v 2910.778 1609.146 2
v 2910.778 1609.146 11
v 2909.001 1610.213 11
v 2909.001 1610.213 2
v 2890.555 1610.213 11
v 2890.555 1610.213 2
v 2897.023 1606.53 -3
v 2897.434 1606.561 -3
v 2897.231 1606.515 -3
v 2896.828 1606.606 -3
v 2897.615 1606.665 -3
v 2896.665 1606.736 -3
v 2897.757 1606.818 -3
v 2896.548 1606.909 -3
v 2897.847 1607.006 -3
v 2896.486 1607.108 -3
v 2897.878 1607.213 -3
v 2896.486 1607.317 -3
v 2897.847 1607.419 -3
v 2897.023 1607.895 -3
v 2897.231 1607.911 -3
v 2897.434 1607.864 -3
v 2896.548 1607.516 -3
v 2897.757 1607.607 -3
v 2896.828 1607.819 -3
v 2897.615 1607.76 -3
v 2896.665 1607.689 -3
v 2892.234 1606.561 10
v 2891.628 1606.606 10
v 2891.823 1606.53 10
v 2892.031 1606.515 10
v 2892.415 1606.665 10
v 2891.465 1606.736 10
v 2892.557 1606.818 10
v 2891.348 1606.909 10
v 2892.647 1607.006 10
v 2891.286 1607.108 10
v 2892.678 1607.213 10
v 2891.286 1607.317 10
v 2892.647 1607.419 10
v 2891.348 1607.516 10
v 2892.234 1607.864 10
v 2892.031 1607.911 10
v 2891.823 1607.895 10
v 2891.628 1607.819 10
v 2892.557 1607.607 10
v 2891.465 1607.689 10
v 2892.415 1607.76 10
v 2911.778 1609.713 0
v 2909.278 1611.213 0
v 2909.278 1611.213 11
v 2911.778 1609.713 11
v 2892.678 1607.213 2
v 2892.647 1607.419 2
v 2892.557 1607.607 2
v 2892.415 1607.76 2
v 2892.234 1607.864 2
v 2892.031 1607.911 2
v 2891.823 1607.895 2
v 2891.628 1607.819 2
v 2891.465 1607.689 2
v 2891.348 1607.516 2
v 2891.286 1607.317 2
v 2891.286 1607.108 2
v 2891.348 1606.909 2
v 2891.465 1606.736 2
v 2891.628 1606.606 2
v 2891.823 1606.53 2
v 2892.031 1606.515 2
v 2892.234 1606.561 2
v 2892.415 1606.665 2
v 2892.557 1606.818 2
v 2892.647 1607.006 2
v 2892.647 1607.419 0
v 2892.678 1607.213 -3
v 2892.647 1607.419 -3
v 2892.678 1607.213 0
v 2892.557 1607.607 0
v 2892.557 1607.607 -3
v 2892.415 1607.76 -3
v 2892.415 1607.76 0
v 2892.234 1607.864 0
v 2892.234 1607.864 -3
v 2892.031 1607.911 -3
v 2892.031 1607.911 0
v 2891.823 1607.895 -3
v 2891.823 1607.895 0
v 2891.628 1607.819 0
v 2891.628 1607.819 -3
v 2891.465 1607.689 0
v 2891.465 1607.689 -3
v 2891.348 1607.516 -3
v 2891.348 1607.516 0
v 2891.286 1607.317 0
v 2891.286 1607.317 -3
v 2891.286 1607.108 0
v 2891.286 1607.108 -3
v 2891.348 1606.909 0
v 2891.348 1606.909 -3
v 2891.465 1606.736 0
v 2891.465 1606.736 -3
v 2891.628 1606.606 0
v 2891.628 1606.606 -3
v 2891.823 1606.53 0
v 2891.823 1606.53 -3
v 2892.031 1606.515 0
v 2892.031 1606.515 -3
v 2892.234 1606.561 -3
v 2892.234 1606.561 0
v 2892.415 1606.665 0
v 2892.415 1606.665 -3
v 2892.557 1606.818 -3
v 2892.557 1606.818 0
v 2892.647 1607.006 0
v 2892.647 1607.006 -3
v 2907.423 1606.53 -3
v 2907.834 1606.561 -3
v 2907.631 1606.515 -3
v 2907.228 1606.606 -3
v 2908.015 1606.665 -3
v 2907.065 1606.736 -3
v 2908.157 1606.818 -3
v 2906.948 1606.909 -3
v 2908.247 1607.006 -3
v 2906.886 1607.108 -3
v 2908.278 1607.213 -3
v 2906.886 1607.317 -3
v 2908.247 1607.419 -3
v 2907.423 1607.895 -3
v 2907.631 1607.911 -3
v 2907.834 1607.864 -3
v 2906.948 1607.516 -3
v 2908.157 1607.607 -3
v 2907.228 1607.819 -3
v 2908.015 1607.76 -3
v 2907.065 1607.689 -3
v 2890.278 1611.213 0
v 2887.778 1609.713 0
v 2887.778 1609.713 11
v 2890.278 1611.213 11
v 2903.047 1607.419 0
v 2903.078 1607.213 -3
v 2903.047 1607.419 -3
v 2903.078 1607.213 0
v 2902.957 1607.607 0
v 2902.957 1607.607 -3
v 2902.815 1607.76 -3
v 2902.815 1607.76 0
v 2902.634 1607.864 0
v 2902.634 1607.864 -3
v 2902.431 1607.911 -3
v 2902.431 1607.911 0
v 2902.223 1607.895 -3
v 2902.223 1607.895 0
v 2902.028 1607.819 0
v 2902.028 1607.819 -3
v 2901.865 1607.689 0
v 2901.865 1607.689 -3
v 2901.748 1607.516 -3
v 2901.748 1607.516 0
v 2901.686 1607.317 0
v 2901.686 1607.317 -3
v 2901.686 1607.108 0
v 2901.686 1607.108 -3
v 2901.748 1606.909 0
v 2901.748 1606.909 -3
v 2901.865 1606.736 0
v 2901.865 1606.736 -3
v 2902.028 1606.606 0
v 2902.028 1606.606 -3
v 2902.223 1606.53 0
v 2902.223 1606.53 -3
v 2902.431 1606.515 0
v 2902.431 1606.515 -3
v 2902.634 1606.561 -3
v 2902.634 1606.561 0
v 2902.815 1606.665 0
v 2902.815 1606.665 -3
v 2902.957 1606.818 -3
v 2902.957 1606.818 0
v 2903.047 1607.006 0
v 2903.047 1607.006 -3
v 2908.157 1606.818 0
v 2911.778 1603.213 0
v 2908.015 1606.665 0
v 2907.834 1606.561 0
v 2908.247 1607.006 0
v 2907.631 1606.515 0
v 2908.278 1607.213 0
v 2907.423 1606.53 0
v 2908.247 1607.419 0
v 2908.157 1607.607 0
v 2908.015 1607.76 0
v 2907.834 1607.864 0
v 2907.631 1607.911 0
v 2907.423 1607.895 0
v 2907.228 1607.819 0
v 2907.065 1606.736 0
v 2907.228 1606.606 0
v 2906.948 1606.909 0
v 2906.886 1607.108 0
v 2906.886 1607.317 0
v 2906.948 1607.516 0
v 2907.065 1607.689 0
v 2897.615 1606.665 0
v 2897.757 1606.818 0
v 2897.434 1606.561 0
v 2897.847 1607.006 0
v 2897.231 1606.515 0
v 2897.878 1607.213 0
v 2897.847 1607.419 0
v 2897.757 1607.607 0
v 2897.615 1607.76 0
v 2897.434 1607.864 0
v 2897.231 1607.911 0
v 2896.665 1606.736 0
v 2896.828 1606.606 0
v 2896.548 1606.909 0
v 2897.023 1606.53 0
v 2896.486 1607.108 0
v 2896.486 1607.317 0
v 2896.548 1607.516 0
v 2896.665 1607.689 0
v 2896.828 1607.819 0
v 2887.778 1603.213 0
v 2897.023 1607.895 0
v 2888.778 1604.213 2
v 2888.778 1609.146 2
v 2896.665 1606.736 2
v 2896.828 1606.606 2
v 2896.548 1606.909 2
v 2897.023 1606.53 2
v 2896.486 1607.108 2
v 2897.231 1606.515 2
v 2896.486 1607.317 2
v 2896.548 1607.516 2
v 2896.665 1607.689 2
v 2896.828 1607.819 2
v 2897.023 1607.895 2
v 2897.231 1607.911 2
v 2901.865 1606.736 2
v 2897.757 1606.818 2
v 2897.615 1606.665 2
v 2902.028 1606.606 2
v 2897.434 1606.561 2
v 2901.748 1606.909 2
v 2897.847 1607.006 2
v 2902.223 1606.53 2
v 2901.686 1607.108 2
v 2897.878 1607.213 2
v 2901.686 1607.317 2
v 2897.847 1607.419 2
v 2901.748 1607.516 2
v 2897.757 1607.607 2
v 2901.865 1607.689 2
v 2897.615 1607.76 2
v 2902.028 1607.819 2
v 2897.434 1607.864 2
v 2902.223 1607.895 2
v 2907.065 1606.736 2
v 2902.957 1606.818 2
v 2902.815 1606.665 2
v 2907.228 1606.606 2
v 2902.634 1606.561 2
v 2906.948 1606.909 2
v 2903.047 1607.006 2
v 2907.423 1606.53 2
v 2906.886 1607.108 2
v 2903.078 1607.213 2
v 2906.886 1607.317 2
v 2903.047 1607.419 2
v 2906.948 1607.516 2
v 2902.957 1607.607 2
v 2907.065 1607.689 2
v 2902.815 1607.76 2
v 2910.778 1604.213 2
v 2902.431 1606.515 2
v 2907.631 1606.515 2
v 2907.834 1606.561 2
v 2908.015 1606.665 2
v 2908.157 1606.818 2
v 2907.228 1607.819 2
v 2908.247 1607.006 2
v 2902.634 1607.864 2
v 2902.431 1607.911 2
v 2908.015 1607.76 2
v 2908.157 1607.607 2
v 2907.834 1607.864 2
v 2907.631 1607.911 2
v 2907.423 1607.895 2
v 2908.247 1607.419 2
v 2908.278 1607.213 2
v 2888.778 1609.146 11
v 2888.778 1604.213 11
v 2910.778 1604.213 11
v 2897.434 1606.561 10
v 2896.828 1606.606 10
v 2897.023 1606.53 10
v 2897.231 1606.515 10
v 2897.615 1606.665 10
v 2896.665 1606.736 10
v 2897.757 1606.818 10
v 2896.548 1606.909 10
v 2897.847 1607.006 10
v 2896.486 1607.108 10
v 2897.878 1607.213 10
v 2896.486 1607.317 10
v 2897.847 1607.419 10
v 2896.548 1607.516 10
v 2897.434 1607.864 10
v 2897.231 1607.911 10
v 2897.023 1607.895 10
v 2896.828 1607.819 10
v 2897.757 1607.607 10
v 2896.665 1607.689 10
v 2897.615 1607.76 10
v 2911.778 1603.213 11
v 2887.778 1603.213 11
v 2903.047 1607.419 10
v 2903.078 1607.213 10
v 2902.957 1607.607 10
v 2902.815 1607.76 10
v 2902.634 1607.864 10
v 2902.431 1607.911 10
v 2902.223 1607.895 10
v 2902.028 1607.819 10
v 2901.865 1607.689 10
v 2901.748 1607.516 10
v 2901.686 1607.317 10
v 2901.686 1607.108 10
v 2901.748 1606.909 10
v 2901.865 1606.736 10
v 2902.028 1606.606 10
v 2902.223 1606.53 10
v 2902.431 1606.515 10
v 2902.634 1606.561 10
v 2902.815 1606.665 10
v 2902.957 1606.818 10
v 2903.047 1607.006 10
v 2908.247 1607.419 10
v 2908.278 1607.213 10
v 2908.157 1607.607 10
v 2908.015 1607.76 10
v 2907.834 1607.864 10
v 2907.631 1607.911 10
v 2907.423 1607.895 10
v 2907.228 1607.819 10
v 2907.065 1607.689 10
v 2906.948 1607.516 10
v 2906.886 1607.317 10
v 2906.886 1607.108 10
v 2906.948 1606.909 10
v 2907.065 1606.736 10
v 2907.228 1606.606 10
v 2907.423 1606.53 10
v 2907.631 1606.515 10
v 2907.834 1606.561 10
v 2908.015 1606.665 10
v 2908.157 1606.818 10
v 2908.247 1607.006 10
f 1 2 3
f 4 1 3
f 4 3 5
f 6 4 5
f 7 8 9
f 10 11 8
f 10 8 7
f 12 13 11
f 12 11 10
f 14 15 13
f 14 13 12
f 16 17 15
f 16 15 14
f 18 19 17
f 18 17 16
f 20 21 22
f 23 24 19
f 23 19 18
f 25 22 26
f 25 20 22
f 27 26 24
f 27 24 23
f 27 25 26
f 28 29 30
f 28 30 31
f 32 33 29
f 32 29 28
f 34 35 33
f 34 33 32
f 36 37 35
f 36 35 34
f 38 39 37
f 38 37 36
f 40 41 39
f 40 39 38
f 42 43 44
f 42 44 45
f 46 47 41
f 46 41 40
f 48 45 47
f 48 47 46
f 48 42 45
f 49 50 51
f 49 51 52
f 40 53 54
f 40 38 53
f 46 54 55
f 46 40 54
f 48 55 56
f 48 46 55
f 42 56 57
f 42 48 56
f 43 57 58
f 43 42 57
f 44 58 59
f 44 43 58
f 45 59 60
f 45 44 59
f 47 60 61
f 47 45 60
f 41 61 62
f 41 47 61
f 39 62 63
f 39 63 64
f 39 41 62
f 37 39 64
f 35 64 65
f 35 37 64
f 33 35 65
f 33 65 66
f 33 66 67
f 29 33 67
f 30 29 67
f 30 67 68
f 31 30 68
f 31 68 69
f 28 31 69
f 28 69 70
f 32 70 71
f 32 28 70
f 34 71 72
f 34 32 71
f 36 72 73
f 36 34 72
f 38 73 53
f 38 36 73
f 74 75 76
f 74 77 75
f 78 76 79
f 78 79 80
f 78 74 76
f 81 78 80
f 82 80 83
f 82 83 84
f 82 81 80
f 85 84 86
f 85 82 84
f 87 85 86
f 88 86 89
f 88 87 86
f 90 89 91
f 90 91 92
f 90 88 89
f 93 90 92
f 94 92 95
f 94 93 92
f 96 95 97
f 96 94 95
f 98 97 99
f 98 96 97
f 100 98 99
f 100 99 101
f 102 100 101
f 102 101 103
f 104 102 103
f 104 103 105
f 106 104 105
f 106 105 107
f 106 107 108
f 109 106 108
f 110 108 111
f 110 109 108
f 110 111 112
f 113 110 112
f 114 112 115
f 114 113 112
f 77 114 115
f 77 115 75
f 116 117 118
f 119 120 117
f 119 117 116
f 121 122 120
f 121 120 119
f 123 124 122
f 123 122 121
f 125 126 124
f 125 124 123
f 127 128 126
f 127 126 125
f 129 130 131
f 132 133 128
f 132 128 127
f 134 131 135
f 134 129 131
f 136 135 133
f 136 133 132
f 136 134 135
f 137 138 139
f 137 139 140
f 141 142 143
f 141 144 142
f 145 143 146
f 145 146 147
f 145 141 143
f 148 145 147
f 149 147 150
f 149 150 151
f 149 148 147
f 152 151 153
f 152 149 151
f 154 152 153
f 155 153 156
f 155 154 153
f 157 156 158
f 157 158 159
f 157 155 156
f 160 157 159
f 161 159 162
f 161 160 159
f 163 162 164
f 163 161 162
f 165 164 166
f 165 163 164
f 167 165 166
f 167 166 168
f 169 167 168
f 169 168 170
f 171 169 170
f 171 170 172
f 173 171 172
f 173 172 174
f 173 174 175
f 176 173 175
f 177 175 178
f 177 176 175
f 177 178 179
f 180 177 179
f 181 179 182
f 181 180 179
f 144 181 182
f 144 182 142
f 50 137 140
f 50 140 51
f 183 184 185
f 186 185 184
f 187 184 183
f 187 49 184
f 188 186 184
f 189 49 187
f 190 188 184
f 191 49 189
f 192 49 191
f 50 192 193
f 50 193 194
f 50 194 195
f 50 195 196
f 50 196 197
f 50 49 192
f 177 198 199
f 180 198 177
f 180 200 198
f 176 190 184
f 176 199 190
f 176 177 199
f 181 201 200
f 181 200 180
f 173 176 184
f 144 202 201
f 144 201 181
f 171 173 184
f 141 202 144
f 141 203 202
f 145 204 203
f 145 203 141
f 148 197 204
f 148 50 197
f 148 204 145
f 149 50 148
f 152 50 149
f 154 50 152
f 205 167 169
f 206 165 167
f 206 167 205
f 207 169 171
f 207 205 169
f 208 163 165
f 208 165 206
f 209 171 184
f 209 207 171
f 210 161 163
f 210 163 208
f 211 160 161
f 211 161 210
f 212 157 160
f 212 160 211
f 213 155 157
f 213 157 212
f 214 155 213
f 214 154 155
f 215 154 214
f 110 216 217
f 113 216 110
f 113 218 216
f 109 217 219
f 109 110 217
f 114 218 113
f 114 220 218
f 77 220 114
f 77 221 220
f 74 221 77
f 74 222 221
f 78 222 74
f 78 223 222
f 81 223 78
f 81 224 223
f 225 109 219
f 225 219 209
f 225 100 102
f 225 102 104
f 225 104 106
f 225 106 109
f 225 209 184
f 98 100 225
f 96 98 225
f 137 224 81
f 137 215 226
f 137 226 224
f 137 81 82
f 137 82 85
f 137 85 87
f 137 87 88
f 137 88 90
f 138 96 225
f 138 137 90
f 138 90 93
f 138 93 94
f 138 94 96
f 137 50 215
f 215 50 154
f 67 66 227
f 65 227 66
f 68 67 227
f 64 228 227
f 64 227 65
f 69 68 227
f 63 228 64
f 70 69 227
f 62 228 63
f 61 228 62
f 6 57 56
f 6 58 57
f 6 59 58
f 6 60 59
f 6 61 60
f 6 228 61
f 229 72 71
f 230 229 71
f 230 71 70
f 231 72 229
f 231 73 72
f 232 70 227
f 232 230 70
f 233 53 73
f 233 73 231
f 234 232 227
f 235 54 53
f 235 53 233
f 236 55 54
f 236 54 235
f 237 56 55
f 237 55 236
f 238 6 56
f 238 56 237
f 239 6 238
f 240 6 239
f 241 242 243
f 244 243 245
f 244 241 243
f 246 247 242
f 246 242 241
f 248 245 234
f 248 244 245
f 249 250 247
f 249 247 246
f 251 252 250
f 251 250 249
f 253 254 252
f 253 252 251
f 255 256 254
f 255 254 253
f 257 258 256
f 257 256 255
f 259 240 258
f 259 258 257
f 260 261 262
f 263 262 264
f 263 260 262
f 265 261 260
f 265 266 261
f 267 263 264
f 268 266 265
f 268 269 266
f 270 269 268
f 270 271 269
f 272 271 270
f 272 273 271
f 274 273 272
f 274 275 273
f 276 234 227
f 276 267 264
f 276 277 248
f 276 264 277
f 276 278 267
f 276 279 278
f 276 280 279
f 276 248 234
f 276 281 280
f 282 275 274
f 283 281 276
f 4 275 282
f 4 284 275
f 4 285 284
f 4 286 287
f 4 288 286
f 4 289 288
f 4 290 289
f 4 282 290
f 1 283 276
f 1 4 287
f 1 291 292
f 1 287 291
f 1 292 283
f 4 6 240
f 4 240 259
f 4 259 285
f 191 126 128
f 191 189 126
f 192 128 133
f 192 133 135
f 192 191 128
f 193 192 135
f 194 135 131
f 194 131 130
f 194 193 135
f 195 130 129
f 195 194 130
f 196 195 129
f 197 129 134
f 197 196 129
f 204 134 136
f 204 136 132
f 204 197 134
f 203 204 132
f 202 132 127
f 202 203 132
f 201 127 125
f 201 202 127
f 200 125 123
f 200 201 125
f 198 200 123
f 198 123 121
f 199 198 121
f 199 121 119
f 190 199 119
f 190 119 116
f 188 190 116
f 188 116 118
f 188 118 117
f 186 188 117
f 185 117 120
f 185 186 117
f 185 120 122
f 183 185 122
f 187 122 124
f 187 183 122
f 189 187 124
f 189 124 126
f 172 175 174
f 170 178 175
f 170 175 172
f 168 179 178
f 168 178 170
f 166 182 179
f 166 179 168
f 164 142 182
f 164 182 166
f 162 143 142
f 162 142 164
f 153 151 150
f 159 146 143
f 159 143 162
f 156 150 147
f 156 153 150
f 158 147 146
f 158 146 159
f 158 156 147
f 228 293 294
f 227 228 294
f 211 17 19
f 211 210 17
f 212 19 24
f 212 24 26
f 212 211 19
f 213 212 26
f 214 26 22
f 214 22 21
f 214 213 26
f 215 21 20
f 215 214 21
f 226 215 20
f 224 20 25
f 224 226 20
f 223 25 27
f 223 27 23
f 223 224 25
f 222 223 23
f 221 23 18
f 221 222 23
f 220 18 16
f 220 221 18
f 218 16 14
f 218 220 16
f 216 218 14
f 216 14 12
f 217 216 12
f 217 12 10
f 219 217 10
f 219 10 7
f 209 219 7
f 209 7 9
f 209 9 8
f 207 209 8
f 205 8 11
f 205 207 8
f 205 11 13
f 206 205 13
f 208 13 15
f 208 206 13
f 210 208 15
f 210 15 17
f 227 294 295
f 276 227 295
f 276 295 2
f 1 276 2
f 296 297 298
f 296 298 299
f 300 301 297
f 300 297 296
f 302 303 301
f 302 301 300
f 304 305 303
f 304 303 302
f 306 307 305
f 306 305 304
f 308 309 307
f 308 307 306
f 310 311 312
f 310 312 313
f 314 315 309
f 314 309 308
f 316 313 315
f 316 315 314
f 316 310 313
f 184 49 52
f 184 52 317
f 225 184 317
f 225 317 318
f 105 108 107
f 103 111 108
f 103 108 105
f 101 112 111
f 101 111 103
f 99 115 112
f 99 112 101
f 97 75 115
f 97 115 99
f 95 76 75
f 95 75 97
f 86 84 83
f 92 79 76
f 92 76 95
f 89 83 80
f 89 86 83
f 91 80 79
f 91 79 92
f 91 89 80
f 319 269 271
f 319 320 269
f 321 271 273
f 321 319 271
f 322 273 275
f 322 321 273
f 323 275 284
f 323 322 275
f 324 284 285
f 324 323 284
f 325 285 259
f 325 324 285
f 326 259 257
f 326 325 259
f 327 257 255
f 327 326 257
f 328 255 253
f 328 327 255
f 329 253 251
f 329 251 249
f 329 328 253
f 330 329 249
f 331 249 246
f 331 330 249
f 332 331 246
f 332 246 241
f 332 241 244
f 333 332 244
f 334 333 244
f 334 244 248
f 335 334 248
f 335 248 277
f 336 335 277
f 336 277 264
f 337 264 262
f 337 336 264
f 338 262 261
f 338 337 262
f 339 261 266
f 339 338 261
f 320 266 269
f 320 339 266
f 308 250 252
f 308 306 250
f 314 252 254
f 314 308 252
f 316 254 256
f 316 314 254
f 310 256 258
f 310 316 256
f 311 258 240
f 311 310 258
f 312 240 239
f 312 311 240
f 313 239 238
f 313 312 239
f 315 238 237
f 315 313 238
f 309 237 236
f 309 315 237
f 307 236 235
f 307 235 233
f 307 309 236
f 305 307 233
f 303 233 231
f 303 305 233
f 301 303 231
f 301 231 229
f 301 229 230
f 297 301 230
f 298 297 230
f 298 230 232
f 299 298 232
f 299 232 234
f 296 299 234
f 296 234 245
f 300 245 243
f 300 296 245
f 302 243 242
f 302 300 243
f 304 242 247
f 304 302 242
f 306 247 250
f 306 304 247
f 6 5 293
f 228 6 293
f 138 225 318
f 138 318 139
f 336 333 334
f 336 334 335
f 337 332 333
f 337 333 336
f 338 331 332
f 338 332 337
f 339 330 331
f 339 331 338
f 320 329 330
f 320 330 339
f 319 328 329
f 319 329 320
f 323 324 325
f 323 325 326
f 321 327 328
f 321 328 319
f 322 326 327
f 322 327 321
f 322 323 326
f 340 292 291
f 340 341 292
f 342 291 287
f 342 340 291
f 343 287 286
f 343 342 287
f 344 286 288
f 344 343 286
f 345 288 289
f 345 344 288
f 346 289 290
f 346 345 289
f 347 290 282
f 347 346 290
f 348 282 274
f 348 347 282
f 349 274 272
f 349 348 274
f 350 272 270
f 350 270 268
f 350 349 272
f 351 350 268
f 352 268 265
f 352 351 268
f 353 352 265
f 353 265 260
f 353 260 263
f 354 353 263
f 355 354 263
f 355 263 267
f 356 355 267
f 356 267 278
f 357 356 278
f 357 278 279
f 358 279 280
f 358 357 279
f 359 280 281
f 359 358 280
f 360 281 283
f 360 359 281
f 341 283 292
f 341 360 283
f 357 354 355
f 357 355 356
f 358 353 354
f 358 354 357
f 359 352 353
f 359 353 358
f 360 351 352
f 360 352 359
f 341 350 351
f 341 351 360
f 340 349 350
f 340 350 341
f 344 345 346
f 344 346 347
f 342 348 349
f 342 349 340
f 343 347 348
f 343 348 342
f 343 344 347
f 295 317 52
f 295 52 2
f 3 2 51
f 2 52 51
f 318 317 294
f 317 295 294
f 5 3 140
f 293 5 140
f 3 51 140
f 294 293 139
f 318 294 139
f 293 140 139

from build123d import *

# Parameters (mm, degrees)
EXTRUDE_1_DEPTH        = 11
CUT_EXTRUDE_1_DEPTH    = 9
SKETCH_3_R             = 0.7
EXTRUDE_2_DEPTH        = 8
SKETCH_4_R             = 1.576566923
CUT_EXTRUDE_2_DEPTH    = 3
PATTERN_LINEAR_1_COUNT = 4
PATTERN_LINEAR_1_PITCH = 5.2


with BuildPart() as part:
    # Model → 凸台-拉伸1 (new body)
    with BuildSketch(Plane.XY):
        Polygon((2890.278305735, 1611.212566626), (2909.278305735, 1611.212566626), (2911.778305735, 1609.712566626), (2911.778305735, 1603.212566626), (2887.778305735, 1603.212566626), (2887.778305735, 1609.712566626), align=None)
    extrude(amount=EXTRUDE_1_DEPTH)

    # 草图2 → 切除-拉伸1 (cut)
    with BuildSketch(Plane.XY.offset(11)):
        Polygon((2890.5552897, 1610.212566626), (2888.778305735, 1609.146376247), (2888.778305735, 1604.212566626), (2910.778305735, 1604.212566626), (2910.778305735, 1609.146376247), (2909.00132177, 1610.212566626), align=None)
    extrude(amount=-CUT_EXTRUDE_1_DEPTH, mode=Mode.SUBTRACT)

    # 草图3 → 凸台-拉伸2 (add, symmetric)
    with BuildSketch(Plane.XY.offset(2)):
        with Locations((2891.978305735, 1607.212566626)):
            Circle(SKETCH_3_R)
    extrude_2 = extrude(amount=EXTRUDE_2_DEPTH, both=True)

    # 草图4 → 切除-拉伸2 (cut)
    with BuildSketch(Plane(origin=(0, 0, -6), x_dir=(-1, 0, 0), z_dir=(0, 0, -1))):
        with Locations((-2891.978305735, 1607.212566626)):
            Circle(SKETCH_4_R)
    cut_extrude_2 = extrude(amount=-CUT_EXTRUDE_2_DEPTH, mode=Mode.SUBTRACT)

    # 阵列(线性)1: 凸台-拉伸2, 切除-拉伸2 ×4
    with Locations(*[(i * PATTERN_LINEAR_1_PITCH, 0, 0) for i in range(1, PATTERN_LINEAR_1_COUNT)]):
        add(extrude_2)
        add(cut_extrude_2, mode=Mode.SUBTRACT)


solid = part.part
